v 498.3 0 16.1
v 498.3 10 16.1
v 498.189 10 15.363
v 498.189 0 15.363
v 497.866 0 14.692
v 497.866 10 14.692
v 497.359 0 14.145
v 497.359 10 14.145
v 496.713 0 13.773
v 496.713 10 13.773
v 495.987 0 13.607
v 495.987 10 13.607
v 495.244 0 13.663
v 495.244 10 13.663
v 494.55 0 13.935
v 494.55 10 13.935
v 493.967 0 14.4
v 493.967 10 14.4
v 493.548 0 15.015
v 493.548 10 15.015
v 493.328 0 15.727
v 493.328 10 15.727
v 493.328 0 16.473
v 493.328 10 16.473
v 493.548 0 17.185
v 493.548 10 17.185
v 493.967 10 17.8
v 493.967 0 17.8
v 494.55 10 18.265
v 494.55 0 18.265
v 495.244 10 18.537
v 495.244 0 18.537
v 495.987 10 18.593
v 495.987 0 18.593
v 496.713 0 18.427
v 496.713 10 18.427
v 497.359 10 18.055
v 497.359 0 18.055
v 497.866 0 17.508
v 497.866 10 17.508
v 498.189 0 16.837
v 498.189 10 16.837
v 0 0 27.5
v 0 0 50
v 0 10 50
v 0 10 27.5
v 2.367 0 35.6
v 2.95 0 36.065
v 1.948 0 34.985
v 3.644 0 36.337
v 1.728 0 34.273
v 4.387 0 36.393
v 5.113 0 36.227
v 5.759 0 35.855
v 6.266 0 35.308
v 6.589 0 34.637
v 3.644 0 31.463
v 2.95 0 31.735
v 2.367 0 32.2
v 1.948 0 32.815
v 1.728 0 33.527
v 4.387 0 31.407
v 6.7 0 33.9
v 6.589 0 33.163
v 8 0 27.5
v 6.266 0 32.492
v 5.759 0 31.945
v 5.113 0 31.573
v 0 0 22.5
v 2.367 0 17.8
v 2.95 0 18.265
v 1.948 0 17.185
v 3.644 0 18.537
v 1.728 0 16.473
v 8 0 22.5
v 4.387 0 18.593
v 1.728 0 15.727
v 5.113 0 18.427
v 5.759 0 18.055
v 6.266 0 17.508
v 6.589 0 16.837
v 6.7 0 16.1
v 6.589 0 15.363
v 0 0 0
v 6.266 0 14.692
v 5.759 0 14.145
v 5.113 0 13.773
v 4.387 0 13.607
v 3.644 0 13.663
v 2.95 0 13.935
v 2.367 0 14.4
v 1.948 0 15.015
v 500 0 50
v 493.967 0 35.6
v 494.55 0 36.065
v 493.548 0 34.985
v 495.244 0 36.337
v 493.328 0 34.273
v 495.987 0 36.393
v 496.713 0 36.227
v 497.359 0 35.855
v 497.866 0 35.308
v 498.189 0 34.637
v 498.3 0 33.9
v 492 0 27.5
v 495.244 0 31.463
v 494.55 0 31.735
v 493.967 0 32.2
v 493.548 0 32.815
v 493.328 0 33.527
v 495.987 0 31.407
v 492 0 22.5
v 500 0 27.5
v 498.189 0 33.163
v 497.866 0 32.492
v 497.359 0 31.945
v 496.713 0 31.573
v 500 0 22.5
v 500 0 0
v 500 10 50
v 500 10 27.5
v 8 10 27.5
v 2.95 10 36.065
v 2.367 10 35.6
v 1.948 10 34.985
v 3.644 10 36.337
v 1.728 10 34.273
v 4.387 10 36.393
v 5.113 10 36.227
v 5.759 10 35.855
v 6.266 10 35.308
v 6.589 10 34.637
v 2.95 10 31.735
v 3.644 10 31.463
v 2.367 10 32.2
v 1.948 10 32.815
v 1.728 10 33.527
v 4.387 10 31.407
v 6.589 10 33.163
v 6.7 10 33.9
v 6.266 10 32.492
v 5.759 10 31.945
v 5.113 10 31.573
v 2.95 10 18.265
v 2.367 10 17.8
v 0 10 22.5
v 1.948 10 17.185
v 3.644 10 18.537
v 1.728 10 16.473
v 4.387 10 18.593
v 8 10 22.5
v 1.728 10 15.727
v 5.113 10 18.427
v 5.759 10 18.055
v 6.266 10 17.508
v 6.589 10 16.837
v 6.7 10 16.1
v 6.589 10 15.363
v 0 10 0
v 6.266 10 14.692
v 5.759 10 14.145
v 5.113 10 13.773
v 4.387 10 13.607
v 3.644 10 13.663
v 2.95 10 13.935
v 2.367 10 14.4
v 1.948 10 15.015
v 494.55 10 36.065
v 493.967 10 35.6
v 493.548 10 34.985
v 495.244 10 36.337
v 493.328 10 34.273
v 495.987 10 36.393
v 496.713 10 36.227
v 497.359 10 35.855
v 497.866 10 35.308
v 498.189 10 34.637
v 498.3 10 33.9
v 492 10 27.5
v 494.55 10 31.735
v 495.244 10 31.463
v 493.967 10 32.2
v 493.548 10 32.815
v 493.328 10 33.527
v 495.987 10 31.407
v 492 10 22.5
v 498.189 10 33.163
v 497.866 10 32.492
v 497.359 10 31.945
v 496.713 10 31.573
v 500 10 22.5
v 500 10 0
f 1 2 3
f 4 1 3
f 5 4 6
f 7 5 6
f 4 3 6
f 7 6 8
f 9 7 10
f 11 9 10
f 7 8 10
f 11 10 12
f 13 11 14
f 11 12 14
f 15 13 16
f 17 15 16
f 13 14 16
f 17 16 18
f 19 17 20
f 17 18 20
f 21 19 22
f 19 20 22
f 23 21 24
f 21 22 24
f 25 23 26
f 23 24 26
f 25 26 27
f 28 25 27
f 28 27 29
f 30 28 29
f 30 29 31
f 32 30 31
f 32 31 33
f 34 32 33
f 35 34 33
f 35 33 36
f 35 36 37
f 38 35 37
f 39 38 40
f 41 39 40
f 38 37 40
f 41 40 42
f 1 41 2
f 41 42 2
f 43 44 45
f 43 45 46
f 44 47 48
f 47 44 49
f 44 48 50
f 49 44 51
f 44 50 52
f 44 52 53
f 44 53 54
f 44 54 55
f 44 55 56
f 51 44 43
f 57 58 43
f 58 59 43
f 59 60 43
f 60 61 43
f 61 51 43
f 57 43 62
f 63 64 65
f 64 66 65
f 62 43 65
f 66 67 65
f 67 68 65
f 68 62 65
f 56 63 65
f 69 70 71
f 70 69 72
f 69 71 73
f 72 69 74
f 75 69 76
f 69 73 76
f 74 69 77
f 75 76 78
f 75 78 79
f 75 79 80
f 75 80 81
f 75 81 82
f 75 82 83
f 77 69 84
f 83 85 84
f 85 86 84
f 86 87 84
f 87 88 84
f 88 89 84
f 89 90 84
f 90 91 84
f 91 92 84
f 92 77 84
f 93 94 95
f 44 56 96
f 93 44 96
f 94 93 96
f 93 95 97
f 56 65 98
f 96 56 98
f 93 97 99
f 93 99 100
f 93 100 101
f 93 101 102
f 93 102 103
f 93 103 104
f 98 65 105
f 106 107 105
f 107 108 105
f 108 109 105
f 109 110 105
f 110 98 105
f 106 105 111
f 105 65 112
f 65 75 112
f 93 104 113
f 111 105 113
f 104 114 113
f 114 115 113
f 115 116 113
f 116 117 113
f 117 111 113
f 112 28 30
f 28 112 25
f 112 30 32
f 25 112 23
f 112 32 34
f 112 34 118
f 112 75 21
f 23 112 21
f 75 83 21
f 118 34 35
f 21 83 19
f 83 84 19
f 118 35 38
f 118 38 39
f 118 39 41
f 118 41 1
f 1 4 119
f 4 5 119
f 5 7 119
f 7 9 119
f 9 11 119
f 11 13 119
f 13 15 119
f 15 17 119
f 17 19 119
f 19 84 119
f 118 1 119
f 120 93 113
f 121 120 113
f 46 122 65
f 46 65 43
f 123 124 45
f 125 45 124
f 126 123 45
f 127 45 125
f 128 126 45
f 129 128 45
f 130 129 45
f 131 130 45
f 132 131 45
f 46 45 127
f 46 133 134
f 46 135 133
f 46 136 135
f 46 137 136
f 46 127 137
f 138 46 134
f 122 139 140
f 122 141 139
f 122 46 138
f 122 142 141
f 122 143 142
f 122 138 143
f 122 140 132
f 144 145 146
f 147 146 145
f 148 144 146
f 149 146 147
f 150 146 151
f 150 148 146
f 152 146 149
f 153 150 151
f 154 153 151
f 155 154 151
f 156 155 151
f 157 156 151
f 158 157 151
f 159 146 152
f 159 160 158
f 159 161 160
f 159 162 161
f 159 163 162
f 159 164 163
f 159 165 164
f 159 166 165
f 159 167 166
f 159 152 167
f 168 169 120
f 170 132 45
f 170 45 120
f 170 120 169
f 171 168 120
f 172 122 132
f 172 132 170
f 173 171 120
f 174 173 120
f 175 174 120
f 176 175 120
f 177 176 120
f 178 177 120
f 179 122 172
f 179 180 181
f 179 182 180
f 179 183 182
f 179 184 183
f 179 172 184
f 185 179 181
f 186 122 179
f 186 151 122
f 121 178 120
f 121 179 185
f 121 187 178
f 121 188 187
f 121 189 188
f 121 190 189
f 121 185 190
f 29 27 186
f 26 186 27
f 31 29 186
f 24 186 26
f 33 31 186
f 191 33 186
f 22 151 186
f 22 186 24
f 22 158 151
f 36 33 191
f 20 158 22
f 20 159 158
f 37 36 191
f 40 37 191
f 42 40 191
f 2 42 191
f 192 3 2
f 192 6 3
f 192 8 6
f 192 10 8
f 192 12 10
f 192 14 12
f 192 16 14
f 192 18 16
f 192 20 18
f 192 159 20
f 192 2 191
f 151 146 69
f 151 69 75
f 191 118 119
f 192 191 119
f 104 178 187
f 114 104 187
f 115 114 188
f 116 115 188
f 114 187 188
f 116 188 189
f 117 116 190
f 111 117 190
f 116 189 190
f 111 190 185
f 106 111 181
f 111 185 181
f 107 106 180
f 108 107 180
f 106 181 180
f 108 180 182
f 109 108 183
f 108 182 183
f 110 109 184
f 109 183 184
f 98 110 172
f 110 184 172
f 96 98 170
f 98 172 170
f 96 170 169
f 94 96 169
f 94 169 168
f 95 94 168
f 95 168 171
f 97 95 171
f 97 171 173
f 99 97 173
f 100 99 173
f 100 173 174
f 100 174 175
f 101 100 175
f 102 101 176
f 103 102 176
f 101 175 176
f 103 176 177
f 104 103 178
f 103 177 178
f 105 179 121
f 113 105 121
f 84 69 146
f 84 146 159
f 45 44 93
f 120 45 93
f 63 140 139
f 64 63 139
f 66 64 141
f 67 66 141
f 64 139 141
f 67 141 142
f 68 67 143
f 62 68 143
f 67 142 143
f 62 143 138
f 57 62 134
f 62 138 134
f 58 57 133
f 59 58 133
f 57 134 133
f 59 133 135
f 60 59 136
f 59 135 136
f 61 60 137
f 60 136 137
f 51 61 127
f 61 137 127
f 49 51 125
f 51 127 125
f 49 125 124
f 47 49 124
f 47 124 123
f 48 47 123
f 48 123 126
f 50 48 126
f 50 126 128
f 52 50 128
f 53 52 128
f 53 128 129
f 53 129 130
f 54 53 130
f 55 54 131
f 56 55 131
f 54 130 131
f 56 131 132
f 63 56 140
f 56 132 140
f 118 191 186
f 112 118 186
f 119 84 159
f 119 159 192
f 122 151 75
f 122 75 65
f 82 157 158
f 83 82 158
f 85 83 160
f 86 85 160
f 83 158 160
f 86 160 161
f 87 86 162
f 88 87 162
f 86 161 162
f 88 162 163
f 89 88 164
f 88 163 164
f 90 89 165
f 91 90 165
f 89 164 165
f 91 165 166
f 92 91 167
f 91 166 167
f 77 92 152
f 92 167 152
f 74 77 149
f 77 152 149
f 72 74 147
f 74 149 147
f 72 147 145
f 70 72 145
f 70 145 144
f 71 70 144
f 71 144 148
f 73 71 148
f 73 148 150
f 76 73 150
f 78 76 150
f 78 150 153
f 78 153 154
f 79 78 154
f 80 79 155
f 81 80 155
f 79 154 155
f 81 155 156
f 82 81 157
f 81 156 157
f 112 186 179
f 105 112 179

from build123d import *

# Parameters (mm, degrees)
SKETCH1_W           = 500
SKETCH1_H           = 50
BOSS_EXTRUDE1_DEPTH = 10
SKETCH2_R           = 2.5
CUT_EXTRUDE1_DEPTH  = 10


with BuildPart() as part:
    # Sketch1 → Boss-Extrude1 (new body)
    with BuildSketch(Plane(origin=(0, 0, 0), x_dir=(1, 0, 0), z_dir=(0, 1, 0))):
        with Locations((250, -25)):
            Rectangle(SKETCH1_W, SKETCH1_H)
    extrude(amount=BOSS_EXTRUDE1_DEPTH)

    # Sketch2 → Cut-Extrude1 (cut)
    with BuildSketch(Plane(origin=(0, 10, 0), x_dir=(1, 0, 0), z_dir=(0, 1, 0))):
        with Locations((4.2, -16.1)):
            Circle(SKETCH2_R)
        with Locations((4.2, -33.9)):
            Circle(SKETCH2_R)
        with Locations((495.8, -33.9)):
            Circle(SKETCH2_R)
        with Locations((495.8, -16.1)):
            Circle(SKETCH2_R)
        Polygon((0, -25), (0, -22.5), (8, -22.5), (8, -27.5), (0, -27.5), align=None)
        Polygon((500, -27.5), (500, -25), (500, -22.5), (492, -22.5), (492, -27.5), align=None)
    extrude(amount=-CUT_EXTRUDE1_DEPTH, mode=Mode.SUBTRACT)


solid = part.part
